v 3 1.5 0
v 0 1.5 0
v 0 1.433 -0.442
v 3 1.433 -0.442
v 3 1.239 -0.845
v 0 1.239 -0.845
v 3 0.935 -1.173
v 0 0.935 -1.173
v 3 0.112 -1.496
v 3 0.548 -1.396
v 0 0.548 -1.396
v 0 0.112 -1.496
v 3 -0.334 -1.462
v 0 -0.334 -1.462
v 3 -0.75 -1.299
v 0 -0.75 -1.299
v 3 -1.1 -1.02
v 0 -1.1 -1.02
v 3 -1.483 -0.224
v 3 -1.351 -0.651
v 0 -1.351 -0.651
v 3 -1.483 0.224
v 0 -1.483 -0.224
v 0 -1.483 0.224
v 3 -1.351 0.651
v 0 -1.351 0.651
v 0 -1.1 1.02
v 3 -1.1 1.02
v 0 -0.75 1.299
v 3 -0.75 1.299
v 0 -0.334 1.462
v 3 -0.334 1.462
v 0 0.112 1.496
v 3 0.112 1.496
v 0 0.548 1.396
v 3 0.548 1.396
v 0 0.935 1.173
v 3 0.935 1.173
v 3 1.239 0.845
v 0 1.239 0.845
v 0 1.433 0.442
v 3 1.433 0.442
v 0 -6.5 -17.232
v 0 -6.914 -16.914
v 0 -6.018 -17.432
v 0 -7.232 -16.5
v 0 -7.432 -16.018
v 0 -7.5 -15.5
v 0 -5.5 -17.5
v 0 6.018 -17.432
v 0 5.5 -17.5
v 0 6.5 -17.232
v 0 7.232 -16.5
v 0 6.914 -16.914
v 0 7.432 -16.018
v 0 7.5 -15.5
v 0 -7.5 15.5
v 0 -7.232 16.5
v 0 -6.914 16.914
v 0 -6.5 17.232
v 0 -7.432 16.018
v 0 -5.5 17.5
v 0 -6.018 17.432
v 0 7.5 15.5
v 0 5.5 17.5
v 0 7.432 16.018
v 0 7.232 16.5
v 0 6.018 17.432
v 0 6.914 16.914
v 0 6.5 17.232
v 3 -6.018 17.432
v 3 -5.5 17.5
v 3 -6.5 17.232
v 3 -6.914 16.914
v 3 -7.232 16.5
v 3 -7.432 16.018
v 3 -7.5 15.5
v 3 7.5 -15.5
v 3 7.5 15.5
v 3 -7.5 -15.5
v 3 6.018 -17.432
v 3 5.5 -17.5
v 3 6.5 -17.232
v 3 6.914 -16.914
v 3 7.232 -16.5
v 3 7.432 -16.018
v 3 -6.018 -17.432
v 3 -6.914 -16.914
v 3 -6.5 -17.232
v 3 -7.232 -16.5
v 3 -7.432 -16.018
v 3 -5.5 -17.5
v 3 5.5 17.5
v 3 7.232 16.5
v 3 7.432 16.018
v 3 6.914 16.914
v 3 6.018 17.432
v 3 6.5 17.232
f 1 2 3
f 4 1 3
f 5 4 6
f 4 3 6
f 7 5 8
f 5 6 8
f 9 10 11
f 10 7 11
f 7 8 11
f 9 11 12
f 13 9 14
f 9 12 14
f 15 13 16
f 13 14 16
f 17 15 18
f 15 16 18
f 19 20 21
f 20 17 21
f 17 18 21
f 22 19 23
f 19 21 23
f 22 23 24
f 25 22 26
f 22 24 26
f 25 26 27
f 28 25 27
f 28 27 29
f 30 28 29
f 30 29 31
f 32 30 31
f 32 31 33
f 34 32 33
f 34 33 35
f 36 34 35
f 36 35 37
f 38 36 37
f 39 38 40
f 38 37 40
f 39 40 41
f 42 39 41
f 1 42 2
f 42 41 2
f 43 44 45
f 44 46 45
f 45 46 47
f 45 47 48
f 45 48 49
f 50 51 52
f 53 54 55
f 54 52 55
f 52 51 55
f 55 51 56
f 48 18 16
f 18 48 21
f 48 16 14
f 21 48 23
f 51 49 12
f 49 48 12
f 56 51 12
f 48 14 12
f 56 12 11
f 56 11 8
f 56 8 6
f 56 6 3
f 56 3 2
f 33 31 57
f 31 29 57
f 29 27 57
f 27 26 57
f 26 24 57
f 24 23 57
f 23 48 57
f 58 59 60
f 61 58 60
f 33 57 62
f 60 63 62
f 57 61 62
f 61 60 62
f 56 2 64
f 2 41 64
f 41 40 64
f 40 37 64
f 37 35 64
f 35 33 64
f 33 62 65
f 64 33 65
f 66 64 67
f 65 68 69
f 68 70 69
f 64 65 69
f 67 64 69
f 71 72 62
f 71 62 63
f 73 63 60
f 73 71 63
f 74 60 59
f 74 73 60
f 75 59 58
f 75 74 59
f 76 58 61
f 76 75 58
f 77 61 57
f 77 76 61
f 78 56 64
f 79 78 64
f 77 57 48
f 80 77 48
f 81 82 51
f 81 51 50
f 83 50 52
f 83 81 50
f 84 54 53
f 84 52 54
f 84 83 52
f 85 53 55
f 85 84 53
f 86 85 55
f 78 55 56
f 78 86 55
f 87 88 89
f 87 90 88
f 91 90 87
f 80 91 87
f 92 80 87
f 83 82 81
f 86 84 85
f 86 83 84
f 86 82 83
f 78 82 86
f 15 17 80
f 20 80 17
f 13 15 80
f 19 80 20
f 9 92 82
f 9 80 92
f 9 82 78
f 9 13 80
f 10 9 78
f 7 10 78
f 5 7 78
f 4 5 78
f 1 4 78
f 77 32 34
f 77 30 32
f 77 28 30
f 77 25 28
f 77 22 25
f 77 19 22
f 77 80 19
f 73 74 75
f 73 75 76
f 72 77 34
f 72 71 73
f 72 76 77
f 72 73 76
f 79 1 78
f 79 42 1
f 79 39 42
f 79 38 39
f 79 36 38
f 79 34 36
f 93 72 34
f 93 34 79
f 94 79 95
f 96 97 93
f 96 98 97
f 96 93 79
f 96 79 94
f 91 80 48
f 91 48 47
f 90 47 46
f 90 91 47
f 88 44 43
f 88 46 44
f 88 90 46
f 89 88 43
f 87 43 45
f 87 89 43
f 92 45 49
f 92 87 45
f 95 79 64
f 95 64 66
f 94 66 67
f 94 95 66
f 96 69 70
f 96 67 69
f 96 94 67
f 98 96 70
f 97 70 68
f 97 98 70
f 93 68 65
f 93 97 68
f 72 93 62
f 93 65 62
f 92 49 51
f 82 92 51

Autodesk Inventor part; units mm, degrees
ref_plane "YZ Plane" through (0, 0, 0) normal (1, 0, 0) x (0, 1, 0)
ref_plane "XZ Plane" through (0, 0, 0) normal (0, 1, 0) x (-1, 0, 0)
ref_plane "XY Plane" through (0, 0, 0) normal (0, 0, 1) x (1, 0, 0)
sketch "Sketch1" plane through (0, 0, 0) normal (1, 0, 0) x (0, 1, 0)
  circle A0 centre (0, 0) radius 1.5
  line L0 (-7.5, 17.5) -> (-7.5, -17.5)
  line L1 (-7.5, -17.5) -> (7.5, -17.5)
  line L2 (7.5, -17.5) -> (7.5, 17.5)
  line L3 (7.5, 17.5) -> (-7.5, 17.5)
  line L4 (-7.5, 17.5) -> (7.5, -17.5) construction
  line L5 (-7.5, -17.5) -> (7.5, 17.5) construction
  dimension "d0" = 3
  dimension "d1" = 35
  dimension "d2" = 15
extrude "Extrusion1" add sketch "Sketch1" along normal blind 3
fillet "Fillet1" radius 2 4 edges at (1.5, 7.5, 17.5) (1.5, -7.5, 17.5) (1.5, -7.5, -17.5) (1.5, 7.5, -17.5)
properties part number "Plate"
